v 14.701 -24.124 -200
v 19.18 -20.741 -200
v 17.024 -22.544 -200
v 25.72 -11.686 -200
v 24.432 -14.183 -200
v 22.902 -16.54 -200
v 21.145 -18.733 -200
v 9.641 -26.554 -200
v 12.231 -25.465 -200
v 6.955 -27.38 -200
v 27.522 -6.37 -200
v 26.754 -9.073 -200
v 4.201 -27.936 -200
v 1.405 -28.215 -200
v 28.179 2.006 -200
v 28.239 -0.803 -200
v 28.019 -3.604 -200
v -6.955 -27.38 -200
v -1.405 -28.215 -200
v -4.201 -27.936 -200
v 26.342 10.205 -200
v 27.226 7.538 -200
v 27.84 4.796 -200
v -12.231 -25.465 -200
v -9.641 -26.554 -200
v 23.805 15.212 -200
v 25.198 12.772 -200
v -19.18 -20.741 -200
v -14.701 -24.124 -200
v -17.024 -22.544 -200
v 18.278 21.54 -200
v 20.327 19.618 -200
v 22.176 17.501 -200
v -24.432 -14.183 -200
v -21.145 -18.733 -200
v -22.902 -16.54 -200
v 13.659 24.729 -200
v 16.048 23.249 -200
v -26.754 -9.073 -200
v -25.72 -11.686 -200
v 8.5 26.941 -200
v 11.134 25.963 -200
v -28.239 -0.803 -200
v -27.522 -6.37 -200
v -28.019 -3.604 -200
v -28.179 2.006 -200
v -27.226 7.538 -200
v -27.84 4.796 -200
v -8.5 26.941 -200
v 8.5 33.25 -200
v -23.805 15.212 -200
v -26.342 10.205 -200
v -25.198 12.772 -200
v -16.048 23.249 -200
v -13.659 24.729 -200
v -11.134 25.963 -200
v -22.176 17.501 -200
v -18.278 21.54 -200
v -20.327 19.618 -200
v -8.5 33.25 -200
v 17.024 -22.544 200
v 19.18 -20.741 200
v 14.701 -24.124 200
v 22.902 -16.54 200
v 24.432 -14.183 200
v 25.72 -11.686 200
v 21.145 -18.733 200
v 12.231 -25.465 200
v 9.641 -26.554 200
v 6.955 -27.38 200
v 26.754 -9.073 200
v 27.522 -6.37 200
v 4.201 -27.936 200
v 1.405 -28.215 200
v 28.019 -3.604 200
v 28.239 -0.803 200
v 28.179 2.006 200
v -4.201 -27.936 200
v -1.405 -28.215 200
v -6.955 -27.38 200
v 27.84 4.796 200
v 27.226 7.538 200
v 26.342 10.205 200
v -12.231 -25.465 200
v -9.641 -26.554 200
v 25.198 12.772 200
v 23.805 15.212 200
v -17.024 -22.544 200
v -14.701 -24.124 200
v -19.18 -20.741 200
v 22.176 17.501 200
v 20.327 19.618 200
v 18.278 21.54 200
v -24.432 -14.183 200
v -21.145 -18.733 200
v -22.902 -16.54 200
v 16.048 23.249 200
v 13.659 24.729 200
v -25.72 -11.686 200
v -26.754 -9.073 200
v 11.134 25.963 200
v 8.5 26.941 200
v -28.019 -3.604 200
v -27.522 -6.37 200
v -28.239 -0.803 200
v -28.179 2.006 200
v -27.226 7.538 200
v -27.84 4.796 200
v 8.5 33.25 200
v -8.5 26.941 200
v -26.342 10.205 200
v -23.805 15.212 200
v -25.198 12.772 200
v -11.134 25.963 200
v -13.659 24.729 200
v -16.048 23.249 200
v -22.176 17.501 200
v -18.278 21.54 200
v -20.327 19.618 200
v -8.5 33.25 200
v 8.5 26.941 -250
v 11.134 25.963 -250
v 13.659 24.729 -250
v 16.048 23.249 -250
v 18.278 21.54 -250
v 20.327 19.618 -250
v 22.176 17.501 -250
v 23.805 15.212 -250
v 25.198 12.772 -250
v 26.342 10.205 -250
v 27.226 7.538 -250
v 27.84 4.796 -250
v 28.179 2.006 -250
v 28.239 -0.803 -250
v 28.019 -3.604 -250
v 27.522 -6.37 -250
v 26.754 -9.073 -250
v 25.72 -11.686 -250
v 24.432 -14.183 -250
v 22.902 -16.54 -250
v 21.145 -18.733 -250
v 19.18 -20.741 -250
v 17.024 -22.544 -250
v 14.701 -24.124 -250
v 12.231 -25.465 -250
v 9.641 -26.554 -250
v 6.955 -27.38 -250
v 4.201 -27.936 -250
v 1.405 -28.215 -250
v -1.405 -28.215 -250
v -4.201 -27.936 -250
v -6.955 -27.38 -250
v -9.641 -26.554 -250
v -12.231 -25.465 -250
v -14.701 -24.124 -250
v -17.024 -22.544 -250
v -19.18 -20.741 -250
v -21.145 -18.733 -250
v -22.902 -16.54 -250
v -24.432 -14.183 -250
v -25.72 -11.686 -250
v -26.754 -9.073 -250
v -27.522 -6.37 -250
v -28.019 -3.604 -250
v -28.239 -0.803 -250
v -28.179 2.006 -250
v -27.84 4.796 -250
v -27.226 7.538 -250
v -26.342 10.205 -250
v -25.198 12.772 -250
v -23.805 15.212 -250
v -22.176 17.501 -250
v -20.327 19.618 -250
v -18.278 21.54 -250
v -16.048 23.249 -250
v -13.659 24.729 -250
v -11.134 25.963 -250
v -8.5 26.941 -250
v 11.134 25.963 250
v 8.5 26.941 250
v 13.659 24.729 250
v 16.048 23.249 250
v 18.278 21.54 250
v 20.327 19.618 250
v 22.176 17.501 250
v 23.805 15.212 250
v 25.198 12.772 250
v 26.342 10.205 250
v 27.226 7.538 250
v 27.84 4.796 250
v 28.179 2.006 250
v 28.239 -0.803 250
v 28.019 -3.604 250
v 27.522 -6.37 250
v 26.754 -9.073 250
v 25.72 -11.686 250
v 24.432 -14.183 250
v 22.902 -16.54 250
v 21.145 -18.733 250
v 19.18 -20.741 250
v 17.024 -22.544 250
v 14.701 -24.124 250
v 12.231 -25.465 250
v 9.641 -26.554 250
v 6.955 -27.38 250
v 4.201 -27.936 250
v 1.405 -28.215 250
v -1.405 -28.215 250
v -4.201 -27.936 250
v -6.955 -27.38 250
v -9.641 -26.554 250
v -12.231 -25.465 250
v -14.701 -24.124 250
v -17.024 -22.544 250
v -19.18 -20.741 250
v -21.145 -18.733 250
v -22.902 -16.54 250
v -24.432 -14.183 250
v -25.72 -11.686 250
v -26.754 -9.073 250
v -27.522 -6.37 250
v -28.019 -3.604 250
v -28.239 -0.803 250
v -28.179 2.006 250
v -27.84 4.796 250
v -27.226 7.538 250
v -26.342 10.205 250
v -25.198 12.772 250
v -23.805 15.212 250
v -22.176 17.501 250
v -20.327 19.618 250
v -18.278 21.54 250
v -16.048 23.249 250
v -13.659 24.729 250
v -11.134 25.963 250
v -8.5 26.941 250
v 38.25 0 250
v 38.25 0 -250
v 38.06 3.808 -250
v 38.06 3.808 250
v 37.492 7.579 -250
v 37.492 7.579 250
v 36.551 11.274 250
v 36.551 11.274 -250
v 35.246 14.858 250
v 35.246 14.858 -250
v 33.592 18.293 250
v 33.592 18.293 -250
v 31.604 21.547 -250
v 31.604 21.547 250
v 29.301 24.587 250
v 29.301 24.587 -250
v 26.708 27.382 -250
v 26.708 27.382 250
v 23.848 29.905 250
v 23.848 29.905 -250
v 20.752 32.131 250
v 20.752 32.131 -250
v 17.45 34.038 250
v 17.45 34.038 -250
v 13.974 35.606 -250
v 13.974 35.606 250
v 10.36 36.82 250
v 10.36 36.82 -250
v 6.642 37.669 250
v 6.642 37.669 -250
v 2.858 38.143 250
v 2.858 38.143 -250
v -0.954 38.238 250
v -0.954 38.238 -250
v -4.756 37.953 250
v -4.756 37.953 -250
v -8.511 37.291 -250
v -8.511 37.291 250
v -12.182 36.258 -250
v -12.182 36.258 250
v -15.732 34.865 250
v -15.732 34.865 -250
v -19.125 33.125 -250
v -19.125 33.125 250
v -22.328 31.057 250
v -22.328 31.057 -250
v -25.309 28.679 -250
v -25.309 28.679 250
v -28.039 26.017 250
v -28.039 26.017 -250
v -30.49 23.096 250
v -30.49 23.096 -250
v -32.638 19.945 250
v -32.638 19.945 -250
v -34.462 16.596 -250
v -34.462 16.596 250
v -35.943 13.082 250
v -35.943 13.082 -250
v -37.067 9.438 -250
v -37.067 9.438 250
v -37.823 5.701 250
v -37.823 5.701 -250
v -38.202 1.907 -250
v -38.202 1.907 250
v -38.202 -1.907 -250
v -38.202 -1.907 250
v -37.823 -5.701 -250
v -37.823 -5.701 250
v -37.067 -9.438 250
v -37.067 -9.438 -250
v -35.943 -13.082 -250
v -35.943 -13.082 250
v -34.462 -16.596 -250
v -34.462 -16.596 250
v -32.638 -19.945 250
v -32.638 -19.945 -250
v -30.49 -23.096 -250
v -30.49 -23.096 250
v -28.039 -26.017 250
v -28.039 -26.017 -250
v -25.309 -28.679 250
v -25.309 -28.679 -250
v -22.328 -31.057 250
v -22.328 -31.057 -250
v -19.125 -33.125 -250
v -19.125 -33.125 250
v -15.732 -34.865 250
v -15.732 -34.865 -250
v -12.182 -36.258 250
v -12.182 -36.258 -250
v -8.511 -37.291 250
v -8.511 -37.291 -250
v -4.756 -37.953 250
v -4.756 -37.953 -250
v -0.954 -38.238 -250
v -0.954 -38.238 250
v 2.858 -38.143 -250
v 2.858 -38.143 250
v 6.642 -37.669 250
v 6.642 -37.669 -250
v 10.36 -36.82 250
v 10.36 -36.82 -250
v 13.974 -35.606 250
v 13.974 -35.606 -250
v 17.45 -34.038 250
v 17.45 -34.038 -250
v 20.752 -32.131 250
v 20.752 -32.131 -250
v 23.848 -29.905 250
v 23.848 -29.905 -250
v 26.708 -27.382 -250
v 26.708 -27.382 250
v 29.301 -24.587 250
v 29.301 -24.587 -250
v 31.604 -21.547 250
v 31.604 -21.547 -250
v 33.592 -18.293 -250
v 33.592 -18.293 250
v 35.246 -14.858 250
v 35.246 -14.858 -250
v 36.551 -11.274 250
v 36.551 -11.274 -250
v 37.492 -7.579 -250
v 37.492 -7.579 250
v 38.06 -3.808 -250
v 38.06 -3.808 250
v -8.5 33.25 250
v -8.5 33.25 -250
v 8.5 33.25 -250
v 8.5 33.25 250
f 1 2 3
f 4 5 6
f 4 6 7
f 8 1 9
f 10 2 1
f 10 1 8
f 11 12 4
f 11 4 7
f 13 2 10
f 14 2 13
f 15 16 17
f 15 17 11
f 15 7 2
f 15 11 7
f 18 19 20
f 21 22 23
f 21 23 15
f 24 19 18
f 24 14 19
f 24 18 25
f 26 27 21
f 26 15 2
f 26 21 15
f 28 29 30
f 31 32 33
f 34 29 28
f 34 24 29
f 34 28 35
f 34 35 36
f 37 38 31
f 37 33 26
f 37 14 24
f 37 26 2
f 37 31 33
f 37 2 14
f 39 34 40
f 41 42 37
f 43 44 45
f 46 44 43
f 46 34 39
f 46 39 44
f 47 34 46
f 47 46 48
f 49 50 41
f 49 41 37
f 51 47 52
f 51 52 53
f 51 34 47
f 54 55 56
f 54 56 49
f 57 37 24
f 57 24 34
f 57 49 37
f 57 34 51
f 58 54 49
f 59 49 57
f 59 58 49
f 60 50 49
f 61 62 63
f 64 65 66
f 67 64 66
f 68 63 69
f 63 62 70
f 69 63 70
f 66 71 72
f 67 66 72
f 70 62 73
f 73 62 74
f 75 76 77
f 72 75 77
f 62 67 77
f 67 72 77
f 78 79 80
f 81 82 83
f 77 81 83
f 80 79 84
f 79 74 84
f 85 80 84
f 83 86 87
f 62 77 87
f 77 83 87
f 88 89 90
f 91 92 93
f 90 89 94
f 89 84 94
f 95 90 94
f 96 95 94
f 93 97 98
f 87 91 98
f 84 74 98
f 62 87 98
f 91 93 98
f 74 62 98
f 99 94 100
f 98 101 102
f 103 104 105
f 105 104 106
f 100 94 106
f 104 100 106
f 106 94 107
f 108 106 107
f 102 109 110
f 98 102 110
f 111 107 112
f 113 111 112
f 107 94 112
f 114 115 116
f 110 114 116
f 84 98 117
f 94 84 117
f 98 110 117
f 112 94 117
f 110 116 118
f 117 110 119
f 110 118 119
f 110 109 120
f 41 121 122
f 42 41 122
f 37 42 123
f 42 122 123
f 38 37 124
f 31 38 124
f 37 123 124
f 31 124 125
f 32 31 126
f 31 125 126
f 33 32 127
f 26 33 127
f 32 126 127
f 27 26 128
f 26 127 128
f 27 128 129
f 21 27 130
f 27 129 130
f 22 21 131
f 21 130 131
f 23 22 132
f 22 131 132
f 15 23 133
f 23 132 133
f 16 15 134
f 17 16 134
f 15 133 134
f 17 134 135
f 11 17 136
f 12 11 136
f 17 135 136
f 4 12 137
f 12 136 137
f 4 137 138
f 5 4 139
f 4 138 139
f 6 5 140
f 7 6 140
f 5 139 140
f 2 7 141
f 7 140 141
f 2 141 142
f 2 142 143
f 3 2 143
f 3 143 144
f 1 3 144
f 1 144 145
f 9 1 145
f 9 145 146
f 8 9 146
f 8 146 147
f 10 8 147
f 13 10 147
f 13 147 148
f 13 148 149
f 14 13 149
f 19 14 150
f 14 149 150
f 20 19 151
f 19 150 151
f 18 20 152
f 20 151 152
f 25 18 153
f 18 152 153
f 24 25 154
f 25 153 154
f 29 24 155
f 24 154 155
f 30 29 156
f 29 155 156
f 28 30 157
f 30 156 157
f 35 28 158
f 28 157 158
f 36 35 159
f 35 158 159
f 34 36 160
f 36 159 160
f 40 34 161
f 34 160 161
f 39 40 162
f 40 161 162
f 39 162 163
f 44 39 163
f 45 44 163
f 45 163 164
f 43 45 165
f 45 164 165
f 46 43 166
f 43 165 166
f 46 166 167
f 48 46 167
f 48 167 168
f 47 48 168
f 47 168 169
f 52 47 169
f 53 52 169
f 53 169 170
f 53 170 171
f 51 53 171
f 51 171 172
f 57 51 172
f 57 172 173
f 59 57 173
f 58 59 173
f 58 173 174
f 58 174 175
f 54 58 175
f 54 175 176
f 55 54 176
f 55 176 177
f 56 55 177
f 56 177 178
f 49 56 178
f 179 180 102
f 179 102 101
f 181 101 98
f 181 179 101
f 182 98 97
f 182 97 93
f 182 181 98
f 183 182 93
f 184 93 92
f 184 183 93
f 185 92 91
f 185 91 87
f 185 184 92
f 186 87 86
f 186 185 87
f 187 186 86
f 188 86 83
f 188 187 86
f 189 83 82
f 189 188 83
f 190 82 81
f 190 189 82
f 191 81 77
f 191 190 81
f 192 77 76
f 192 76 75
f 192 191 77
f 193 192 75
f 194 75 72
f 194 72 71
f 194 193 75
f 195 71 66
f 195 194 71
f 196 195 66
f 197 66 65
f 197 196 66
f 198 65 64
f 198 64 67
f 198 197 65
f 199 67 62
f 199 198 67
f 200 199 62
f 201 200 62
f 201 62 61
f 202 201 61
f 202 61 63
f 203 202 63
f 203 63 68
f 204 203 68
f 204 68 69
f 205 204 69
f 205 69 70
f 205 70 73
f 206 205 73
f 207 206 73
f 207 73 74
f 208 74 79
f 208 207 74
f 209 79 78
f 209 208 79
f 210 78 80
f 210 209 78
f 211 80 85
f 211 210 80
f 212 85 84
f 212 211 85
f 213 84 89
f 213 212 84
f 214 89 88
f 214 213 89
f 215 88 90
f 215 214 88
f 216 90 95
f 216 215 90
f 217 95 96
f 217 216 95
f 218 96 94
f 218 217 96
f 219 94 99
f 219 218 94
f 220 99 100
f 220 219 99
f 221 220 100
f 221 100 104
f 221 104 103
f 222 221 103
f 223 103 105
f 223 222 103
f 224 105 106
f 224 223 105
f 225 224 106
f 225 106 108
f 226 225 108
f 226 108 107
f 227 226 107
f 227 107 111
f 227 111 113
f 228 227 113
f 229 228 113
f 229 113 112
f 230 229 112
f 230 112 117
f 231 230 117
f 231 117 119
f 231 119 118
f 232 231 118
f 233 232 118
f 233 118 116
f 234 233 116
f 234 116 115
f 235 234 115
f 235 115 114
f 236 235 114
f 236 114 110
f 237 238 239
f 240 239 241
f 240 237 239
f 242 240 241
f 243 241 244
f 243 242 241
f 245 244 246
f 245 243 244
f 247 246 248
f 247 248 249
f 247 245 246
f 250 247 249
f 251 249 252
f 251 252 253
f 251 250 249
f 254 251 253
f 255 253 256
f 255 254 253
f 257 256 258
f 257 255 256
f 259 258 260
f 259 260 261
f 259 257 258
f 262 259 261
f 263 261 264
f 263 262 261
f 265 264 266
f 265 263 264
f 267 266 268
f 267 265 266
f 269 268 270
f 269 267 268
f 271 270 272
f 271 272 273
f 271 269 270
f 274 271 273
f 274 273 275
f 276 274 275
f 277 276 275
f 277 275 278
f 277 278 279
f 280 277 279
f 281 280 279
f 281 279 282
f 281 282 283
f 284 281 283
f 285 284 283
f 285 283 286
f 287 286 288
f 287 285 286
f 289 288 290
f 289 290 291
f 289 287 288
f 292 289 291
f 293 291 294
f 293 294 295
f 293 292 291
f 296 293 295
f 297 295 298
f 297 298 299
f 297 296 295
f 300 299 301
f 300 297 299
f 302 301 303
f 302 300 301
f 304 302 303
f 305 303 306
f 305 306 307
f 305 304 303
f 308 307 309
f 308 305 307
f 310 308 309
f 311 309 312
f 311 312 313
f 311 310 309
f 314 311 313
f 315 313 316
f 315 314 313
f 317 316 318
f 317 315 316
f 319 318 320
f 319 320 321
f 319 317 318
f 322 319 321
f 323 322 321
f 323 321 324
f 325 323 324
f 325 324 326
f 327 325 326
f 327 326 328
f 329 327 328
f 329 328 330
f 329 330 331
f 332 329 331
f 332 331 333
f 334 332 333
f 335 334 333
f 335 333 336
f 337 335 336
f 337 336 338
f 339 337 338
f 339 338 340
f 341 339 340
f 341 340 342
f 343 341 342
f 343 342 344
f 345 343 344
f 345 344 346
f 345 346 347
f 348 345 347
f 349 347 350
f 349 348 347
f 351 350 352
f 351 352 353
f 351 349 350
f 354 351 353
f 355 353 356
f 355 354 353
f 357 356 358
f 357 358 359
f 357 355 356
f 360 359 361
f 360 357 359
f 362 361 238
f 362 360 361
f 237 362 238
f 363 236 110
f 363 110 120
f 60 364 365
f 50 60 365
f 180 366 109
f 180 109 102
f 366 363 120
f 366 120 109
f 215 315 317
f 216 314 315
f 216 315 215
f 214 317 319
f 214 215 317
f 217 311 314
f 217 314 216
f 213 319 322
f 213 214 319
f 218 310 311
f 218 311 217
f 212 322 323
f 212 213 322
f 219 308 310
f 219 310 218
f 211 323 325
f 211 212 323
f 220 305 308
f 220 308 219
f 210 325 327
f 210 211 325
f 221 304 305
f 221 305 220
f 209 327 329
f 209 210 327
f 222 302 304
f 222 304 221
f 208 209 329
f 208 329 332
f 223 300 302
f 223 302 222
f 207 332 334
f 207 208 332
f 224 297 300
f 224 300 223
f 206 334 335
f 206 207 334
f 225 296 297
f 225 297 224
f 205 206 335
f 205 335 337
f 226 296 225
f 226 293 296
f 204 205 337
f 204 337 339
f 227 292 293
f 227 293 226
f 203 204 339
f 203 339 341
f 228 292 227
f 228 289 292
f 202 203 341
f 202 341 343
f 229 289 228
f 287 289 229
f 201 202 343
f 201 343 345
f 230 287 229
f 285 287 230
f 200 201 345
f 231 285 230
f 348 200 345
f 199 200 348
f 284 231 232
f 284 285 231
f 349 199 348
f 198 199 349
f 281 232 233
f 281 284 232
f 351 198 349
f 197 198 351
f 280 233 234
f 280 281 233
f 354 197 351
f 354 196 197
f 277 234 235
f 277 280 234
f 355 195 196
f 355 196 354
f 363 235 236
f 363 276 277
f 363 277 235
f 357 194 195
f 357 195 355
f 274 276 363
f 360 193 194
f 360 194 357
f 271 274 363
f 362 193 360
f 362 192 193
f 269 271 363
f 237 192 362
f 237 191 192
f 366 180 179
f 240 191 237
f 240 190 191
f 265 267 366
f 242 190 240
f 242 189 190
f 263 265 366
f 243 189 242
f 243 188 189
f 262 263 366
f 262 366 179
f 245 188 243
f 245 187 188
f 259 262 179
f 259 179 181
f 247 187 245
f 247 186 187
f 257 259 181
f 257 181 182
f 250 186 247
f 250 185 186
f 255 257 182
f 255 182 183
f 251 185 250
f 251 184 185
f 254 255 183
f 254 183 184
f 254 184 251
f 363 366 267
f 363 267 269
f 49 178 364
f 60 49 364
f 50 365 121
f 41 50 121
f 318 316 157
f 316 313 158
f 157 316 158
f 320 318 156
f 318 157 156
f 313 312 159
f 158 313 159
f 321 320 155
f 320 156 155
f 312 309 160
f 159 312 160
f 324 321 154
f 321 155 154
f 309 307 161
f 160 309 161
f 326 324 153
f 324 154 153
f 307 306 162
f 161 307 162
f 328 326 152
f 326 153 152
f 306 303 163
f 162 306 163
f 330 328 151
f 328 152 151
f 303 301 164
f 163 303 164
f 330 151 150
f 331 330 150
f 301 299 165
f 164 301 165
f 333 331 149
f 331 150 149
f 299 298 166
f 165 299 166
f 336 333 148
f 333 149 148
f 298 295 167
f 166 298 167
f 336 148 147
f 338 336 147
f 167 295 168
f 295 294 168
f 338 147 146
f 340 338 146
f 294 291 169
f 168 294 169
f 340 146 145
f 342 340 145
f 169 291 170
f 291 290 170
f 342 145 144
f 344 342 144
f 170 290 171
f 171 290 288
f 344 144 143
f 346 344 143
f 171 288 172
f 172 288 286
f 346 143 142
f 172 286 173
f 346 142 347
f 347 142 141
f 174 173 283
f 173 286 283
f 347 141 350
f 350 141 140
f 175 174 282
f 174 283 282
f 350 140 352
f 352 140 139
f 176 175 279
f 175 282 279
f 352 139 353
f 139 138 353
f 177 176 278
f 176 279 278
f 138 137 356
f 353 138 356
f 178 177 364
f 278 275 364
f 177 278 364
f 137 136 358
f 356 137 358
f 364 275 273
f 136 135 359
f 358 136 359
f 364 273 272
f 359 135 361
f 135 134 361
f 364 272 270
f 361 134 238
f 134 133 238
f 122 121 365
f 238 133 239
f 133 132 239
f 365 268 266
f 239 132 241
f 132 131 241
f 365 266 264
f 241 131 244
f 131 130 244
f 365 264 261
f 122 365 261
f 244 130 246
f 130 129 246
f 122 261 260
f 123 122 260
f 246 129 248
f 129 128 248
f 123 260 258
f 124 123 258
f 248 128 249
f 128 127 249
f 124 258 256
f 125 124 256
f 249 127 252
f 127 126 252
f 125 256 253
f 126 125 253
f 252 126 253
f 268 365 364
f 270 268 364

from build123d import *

# Parameters (mm, degrees)
SKETCH1_R           = 38.25
BOSS_EXTRUDE1_DEPTH = 250
CUT_EXTRUDE2_DEPTH  = 50


with BuildPart() as part:
    # Sketch1 → Boss-Extrude1 (new body)
    with BuildSketch(Plane.XY):
        Circle(SKETCH1_R)
    boss_extrude1 = extrude(amount=BOSS_EXTRUDE1_DEPTH)

    # Sketch3 → Cut-Extrude2 (cut)
    with BuildSketch(Plane.XY.offset(250)):
        with BuildLine():
            Line((-8.5, 26.940907557), (-8.5, 33.25))
            Line((-8.5, 33.25), (8.5, 33.25))
            Line((8.5, 33.25), (8.5, 26.940907557))
            ThreePointArc((8.5, 26.940907557), (0, -28.25), (-8.5, 26.940907557))
        make_face()
    cut_extrude2 = extrude(amount=-CUT_EXTRUDE2_DEPTH, mode=Mode.SUBTRACT)

    # Mirror1: Boss-Extrude1, Cut-Extrude2 across plane
    add(boss_extrude1.mirror(Plane.XY))
    add(cut_extrude2.mirror(Plane.XY), mode=Mode.SUBTRACT)


solid = part.part
